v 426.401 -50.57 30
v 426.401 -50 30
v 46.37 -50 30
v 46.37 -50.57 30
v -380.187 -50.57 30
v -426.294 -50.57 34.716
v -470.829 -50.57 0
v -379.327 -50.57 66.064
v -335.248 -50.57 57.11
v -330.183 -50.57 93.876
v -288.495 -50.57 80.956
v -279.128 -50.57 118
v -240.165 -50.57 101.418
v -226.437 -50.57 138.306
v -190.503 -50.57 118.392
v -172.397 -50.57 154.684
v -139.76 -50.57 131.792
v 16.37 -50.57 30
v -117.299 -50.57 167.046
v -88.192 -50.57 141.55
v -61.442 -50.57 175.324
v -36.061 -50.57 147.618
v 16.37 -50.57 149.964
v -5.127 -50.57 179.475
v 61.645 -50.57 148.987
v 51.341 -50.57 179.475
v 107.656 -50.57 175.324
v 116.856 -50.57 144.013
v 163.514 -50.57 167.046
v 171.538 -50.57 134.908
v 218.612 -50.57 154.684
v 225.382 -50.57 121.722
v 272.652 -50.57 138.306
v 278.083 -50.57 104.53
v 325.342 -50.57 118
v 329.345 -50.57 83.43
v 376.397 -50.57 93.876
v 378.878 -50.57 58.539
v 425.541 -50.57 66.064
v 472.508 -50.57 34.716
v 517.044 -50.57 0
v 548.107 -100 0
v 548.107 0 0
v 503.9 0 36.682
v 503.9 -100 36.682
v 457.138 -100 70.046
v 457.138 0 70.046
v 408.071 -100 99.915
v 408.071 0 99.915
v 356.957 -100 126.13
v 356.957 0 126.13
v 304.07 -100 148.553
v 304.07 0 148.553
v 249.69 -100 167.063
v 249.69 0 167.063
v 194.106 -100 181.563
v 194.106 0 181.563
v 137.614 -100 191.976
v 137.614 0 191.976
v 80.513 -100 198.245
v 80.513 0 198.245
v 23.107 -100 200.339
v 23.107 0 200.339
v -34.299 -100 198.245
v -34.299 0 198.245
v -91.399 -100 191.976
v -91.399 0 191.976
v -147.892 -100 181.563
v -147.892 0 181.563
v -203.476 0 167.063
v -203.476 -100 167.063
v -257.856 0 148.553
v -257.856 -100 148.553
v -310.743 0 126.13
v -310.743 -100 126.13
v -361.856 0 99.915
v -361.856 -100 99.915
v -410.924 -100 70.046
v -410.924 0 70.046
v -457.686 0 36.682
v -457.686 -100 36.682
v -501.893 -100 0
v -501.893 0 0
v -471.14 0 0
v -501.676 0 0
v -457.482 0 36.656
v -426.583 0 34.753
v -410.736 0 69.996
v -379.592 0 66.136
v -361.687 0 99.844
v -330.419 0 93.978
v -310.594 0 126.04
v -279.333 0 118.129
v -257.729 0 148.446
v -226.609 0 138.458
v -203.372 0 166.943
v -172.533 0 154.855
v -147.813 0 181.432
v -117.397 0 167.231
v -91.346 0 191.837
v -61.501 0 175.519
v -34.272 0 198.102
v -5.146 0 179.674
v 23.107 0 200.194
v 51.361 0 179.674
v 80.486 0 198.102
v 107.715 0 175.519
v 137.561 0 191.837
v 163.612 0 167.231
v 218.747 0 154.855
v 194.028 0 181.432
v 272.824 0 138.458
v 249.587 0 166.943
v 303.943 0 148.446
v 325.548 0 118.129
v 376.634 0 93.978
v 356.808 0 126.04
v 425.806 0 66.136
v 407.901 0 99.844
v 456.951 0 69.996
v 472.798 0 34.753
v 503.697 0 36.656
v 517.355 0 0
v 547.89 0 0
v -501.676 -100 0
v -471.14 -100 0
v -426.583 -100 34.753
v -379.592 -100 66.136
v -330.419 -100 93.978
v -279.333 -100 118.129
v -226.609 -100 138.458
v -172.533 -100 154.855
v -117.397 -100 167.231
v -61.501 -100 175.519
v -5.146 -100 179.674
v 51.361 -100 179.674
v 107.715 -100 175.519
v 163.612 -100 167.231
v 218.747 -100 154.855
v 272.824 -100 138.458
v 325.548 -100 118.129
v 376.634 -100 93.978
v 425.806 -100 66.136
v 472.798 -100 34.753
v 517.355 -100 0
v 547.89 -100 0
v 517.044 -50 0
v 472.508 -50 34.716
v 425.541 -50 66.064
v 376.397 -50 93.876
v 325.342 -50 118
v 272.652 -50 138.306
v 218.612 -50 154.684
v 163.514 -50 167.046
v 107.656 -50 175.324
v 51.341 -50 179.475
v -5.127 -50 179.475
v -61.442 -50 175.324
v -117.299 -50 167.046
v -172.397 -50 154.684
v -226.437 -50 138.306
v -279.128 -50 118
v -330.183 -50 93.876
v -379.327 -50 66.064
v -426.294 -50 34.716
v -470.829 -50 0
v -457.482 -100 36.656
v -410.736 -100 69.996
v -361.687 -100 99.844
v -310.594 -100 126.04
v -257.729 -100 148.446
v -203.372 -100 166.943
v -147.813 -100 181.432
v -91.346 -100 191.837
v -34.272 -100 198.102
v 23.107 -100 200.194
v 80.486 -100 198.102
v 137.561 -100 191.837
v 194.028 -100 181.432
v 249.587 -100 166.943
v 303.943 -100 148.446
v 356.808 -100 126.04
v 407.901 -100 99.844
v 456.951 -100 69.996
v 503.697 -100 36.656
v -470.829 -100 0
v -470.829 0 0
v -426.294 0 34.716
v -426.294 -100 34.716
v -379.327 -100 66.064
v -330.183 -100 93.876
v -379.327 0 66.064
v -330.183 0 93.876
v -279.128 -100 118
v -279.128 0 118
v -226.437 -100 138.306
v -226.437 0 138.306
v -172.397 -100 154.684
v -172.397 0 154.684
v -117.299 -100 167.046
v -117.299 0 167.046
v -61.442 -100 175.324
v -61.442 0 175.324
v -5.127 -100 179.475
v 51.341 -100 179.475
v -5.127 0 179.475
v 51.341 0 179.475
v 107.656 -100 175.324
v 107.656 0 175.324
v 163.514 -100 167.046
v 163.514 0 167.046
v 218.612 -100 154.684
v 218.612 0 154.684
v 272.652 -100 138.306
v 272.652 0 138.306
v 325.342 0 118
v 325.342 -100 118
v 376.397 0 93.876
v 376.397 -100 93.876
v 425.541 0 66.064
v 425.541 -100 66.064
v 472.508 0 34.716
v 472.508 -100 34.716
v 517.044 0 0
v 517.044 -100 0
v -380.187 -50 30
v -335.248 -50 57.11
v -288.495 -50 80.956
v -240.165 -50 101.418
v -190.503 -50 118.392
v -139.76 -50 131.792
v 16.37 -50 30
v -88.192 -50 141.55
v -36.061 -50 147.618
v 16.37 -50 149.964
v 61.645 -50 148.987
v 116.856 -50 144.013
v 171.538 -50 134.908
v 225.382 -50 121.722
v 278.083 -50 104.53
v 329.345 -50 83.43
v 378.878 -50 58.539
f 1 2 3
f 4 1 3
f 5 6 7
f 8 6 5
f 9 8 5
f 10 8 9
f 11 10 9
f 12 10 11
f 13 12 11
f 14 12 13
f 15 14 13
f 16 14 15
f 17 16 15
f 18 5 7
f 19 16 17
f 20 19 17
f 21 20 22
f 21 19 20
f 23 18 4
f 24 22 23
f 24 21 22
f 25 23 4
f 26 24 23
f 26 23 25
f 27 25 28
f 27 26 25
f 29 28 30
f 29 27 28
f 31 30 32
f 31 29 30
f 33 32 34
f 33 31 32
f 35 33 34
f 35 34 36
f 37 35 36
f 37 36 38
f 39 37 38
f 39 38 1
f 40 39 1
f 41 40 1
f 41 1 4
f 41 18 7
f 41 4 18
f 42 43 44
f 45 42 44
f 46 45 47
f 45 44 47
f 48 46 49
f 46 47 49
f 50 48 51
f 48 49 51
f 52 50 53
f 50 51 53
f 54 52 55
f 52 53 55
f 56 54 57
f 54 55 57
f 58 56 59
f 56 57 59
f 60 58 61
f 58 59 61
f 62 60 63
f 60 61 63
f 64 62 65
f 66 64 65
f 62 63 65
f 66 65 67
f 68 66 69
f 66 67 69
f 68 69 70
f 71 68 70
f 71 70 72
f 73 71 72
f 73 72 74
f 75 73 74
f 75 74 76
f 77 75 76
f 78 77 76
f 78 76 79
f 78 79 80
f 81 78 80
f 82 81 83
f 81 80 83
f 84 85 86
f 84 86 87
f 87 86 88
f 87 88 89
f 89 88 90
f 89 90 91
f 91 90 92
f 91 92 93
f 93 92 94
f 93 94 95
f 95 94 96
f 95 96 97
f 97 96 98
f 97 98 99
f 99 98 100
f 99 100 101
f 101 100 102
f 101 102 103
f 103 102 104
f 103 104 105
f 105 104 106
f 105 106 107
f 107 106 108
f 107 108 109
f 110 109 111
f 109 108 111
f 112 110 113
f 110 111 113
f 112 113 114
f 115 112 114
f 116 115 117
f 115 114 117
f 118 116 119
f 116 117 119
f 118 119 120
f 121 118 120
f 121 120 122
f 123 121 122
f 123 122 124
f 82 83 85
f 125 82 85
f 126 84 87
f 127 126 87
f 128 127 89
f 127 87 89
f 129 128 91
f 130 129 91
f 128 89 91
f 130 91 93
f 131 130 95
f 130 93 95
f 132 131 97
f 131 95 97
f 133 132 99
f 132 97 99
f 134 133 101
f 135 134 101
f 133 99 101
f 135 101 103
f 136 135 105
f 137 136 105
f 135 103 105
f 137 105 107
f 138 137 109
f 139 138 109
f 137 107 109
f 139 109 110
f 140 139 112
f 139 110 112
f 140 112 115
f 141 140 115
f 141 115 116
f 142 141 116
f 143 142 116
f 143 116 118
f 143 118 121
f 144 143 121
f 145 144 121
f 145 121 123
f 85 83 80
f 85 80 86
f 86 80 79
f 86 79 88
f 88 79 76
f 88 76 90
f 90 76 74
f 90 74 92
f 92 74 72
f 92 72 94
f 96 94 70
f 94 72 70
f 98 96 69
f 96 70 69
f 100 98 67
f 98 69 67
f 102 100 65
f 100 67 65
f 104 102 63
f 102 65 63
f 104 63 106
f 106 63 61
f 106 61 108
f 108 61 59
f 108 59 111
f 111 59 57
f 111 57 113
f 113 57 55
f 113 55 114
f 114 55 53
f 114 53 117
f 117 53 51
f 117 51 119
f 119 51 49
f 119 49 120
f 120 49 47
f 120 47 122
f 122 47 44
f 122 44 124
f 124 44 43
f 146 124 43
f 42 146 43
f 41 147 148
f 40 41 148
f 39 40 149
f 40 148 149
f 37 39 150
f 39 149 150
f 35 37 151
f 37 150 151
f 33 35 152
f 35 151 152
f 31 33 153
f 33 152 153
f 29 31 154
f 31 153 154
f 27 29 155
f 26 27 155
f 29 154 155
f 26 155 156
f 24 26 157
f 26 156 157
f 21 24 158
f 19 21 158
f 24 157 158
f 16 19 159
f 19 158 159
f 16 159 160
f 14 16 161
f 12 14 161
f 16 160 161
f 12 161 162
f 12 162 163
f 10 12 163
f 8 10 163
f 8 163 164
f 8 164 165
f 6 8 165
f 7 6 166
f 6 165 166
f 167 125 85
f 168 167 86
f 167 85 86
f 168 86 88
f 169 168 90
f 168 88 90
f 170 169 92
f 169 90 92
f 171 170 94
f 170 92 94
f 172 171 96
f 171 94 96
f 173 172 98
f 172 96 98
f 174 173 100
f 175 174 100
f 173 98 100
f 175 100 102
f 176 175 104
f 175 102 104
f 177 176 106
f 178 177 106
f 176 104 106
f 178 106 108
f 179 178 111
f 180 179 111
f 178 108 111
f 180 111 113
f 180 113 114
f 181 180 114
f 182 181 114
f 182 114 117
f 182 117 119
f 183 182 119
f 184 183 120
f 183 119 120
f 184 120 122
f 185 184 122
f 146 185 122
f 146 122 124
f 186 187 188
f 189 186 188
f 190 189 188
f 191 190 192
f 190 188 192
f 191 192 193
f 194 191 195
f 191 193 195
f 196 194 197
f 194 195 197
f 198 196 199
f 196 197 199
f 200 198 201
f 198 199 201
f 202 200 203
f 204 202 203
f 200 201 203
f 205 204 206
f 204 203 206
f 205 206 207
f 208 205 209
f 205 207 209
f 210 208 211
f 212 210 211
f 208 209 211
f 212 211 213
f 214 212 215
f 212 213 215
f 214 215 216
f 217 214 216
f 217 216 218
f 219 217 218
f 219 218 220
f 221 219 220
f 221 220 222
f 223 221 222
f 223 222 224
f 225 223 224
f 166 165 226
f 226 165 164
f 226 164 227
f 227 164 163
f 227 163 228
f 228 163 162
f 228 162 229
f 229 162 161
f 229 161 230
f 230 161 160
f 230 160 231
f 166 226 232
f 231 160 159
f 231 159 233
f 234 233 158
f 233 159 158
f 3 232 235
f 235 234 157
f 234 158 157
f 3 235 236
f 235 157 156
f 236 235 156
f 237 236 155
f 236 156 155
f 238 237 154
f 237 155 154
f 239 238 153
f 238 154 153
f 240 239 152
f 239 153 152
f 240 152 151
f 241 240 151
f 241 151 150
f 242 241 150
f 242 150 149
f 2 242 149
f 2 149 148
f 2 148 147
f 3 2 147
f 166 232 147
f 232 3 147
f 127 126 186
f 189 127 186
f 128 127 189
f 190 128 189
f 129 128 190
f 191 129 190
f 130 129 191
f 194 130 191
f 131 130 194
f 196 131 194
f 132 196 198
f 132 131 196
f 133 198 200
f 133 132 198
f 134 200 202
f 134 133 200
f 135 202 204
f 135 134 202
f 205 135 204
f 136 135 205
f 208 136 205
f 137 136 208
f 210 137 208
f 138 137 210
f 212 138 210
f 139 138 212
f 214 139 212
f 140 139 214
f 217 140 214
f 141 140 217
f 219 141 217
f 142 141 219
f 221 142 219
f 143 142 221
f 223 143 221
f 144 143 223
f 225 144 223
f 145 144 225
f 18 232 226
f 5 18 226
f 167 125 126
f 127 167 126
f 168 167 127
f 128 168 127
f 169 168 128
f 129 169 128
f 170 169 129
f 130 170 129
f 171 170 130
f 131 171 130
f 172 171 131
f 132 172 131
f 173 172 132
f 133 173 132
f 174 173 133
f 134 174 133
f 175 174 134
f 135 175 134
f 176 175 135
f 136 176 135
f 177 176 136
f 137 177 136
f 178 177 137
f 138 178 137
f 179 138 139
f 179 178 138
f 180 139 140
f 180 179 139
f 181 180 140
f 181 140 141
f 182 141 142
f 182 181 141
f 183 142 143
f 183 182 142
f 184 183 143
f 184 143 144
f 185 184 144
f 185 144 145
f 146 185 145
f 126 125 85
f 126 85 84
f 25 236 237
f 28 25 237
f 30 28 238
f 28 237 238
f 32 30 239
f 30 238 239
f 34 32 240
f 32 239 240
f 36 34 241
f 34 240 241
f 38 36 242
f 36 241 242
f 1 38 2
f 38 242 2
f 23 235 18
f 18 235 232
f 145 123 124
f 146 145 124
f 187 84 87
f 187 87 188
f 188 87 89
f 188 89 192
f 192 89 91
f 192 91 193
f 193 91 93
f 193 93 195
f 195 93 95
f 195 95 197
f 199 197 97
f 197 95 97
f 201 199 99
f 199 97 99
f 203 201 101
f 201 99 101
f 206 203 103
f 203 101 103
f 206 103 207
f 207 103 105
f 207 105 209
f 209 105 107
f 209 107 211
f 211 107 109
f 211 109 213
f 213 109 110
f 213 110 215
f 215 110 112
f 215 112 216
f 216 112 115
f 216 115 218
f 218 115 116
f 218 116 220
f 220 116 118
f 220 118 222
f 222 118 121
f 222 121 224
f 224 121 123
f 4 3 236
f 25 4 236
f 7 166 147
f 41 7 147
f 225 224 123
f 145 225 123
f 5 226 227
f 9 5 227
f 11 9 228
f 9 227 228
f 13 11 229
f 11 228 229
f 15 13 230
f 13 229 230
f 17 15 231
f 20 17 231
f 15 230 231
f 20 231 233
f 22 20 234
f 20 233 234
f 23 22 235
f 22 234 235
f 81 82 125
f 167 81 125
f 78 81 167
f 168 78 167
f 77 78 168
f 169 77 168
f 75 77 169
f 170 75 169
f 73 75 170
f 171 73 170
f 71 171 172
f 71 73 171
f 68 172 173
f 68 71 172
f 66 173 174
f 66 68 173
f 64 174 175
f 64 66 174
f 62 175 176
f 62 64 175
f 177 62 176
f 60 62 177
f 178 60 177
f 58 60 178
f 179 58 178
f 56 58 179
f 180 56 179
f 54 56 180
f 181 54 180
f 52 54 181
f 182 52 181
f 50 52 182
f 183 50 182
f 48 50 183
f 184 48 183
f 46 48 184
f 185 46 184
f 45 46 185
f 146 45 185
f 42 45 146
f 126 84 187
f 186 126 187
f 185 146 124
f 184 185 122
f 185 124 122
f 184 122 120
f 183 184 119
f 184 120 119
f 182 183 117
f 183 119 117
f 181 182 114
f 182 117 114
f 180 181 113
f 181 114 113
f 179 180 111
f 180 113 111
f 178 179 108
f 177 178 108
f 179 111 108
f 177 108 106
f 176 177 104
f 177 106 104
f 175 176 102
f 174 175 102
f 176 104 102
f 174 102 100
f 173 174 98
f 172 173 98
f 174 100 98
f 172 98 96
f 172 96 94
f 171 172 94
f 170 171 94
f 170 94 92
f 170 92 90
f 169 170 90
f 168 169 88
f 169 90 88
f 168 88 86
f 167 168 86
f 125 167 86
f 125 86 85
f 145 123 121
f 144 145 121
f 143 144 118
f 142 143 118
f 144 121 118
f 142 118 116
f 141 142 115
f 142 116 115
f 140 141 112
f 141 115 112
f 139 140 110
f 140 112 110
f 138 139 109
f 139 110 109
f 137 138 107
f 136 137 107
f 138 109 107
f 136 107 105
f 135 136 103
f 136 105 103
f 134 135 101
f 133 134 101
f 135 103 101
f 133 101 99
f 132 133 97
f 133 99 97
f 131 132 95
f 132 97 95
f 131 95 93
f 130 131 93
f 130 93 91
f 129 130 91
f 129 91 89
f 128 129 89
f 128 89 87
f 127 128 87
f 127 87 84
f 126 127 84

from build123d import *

# Parameters (mm, degrees)
F1_DEPTH = 100
F3_DEPTH = 100
F5_DEPTH = 100
F7_START = 50
F7_DEPTH = 0.57


with BuildPart() as f1:
    # F0 (on Front) → F1 (new body)
    with BuildSketch(Plane.XZ):
        with BuildLine():
            Line((547.8902823917, 0), (548.1072823917, 0))
            ThreePointArc((548.1072823917, 0), (23.1072823917, 200.338842807), (-501.8927176083, 0))
            Line((-501.8927176083, 0), (-501.6757176083, 0))
            ThreePointArc((-501.6757176083, 0), (23.1072823917, 200.1942967494), (547.8902823917, 0))
        make_face()
    extrude(amount=F1_DEPTH)


with BuildPart() as f3:
    # F2 (on Front) → F3 (new body)
    with BuildSketch(Plane.XZ):
        with BuildLine():
            Line((517.3545078457, 0), (547.8902823917, 0))
            ThreePointArc((547.8902823917, 0), (23.1072823917, 200.1942967494), (-501.6757176083, 0))
            Line((-501.6757176083, 0), (-471.1399430623, 0))
            ThreePointArc((-471.1399430623, 0), (23.1072823917, 180.1942967494), (517.3545078457, 0))
        make_face()
    extrude(amount=F3_DEPTH)


with BuildPart() as f5:
    # F4 (on Front) → F5 (new body)
    with BuildSketch(Plane.XZ):
        with BuildLine():
            Line((517.0437065363, 0), (517.3545078457, 0))
            ThreePointArc((517.3545078457, 0), (23.1072823917, 180.1942967494), (-471.1399430623, 0))
            Line((-471.1399430623, 0), (-470.829141753, 0))
            ThreePointArc((-470.829141753, 0), (23.1072823917, 179.9942967494), (517.0437065363, 0))
        make_face()
    extrude(amount=F5_DEPTH)


with BuildPart() as f7:
    # F6 (on Front) → F7 (new body)
    with BuildSketch(Plane.XZ.offset(F7_START)):
        with BuildLine():
            ThreePointArc((517.0437065363, 0), (23.1072823917, 179.9942967494), (-470.829141753, 0))
            Line((-470.829141753, 0), (517.0437065363, 0))
        make_face()
        with BuildLine():
            Line((16.369633609, 30), (-380.1869244123, 30))
            ThreePointArc((-380.1869244123, 30), (-190.5029764681, 118.3915516923), (16.369633609, 149.9635284776))
            Line((16.369633609, 149.9635284776), (16.369633609, 30))
        make_face(mode=Mode.SUBTRACT)
        with BuildLine():
            ThreePointArc((61.6449337647, 148.9870302594), (251.8939211351, 113.62129558), (426.4014891957, 30))
            Line((426.4014891957, 30), (46.369633609, 30))
            Line((46.369633609, 30), (61.6449337647, 148.9870302594))
        make_face(mode=Mode.SUBTRACT)
    extrude(amount=F7_DEPTH)


solid = Compound([f1.part, f3.part, f5.part, f7.part])
